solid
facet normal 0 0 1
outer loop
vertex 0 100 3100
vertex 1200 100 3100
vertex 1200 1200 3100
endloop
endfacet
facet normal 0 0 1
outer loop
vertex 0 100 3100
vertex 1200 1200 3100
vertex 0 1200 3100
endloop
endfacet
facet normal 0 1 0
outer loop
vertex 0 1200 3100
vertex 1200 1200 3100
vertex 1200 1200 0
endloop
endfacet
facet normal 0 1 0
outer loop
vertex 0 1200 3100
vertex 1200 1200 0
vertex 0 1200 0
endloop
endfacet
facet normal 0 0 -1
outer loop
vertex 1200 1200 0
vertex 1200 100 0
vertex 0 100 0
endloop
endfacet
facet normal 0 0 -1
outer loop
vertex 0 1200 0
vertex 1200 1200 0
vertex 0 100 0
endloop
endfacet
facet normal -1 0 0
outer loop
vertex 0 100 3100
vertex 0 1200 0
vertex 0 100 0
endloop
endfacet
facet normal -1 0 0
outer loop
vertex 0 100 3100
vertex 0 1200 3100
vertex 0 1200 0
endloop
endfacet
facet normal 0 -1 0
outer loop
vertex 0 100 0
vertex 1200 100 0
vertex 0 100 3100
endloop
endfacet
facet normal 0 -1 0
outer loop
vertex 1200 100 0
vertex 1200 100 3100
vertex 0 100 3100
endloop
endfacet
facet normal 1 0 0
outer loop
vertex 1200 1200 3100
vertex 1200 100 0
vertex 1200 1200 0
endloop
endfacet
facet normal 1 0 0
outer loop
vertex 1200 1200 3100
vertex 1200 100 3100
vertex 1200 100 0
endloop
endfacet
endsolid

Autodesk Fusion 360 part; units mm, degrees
sketch "スケッチ1" plane through (0, 0, 0) normal (0, 1, 0) x (1, 0, 0)
sketch "スケッチ2" plane through (0, 0, 0) normal (0, 0, 1) x (1, 0, 0)
  line L0 (0, 0) -> (-10000, 0)
  line L1 (-10000, 0) -> (-10000, 8100)
  line L2 (-10000, 8100) -> (0, 8100)
  line L3 (0, 8100) -> (0, 0)
  line L4 (10, -10) -> (-10010, -10)
  line L5 (-10010, -10) -> (-10010, 8110)
  line L6 (-10010, 8110) -> (10, 8110)
  line L7 (10, 8110) -> (10, -10)
  point P0 (10, -10)
  dimension "d1" = 10000
  dimension "d2" = 8100
  dimension "d4" = 10020
  dimension "d5" = 8120
sketch "スケッチ3" plane through (0, 0, 0) normal (0, 0, 1) x (1, 0, 0)
sketch "スケッチ4" plane through (0, 0, 0) normal (0, 0, 1) x (1, 0, 0)
  line L0 (0, 0) -> (1200, 0)
  line L1 (1200, 0) -> (1200, 1000)
  line L2 (1200, 1000) -> (0, 1000)
  line L3 (0, 1000) -> (0, 0)
  dimension "d10" = 1200
  dimension "d11" = 1000
extrude "押し出し2" add sketch "スケッチ4" along normal blind 3100
sketch "スケッチ5" plane through (0, 0, 3100) normal (0, 0, 1) x (-1, 0, 0)
  line L0 (0, -1000) -> (0, 0)
  line L1 (0, 0) -> (-1200, 0)
  line L2 (-1200, 0) -> (-1200, -1000)
  line L3 (-1200, -1000) -> (0, -1000)
  line L4 (0, 0) -> (-1200, 0)
  line L5 (-1200, 0) -> (-1200, -100)
  line L6 (-1200, -100) -> (0, -100)
  line L7 (0, -100) -> (0, 0)
extrude "押し出し3" cut sketch "スケッチ5" against normal blind 3100 contours L0 L1 L2 L4 L5 L6 L7
sketch "スケッチ6" plane through (0, 0, 3100) normal (0, 0, 1) x (-1, 0, 0)
  line L0 (0, -100) -> (-1200, -100)
  line L1 (-1200, -100) -> (-1200, -1000)
  line L2 (-1200, -1000) -> (0, -1000)
  line L3 (0, -1000) -> (0, -100)
  line L4 (0, -1000) -> (-1200, -1000)
  line L5 (-1200, -1000) -> (-1200, -1200)
  line L6 (-1200, -1200) -> (0, -1200)
  line L7 (0, -1200) -> (0, -1000)
extrude "押し出し4" add sketch "スケッチ6" against normal blind 3100 contours L2 L4 L5 L6 L7
